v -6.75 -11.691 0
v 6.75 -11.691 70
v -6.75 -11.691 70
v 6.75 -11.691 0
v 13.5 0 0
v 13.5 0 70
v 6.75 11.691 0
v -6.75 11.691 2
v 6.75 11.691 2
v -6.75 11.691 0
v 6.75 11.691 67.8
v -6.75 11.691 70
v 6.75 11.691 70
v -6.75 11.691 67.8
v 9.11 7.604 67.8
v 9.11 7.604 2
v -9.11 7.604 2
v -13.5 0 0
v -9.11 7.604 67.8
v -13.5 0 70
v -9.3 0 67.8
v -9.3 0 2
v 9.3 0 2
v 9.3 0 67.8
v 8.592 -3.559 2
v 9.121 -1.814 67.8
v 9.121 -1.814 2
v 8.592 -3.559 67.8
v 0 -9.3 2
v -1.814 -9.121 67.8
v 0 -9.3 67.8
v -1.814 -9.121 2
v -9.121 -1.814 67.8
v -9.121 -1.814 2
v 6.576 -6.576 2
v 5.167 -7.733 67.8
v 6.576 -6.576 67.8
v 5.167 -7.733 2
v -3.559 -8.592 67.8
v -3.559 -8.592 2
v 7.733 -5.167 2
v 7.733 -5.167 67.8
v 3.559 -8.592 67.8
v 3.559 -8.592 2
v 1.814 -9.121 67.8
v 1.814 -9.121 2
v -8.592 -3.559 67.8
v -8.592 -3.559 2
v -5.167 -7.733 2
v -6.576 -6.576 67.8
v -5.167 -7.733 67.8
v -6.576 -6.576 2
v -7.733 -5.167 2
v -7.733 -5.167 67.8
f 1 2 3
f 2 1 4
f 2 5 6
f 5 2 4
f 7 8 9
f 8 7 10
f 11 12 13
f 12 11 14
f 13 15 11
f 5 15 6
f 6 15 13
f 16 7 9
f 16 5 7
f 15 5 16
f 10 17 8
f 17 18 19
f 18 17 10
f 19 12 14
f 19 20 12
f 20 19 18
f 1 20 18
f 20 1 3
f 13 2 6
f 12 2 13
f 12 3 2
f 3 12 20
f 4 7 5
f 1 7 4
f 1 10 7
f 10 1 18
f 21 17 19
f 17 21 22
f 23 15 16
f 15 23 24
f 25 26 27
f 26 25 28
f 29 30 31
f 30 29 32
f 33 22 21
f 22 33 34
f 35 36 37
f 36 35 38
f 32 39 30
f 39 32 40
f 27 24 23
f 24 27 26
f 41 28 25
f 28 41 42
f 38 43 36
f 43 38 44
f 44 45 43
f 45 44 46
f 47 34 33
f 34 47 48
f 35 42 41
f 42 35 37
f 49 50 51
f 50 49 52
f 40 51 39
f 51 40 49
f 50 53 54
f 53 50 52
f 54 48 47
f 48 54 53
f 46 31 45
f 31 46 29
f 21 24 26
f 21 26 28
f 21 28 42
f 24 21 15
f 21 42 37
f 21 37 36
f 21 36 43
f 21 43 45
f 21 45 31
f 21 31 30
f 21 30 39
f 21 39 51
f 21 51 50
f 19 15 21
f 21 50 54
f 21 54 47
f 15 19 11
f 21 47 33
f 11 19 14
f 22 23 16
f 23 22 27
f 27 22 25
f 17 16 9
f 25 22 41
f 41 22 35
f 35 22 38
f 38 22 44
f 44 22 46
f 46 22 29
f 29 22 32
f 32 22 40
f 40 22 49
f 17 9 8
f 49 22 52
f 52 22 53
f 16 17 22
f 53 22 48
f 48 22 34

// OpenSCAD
module A_BatteryHolder() {
  difference() {
    cylinder(r=27/2, h=70, $fn=6);
    
    #
    translate([0,0,2])
    hull() {
      translate([0,8,0])
        cylinder(r=18.2/2, h=65.8,$fn=32);
        
      cylinder(r=18.6/2,h=65.8,$fn=32);
    }
  
  }
}

A_BatteryHolder();
